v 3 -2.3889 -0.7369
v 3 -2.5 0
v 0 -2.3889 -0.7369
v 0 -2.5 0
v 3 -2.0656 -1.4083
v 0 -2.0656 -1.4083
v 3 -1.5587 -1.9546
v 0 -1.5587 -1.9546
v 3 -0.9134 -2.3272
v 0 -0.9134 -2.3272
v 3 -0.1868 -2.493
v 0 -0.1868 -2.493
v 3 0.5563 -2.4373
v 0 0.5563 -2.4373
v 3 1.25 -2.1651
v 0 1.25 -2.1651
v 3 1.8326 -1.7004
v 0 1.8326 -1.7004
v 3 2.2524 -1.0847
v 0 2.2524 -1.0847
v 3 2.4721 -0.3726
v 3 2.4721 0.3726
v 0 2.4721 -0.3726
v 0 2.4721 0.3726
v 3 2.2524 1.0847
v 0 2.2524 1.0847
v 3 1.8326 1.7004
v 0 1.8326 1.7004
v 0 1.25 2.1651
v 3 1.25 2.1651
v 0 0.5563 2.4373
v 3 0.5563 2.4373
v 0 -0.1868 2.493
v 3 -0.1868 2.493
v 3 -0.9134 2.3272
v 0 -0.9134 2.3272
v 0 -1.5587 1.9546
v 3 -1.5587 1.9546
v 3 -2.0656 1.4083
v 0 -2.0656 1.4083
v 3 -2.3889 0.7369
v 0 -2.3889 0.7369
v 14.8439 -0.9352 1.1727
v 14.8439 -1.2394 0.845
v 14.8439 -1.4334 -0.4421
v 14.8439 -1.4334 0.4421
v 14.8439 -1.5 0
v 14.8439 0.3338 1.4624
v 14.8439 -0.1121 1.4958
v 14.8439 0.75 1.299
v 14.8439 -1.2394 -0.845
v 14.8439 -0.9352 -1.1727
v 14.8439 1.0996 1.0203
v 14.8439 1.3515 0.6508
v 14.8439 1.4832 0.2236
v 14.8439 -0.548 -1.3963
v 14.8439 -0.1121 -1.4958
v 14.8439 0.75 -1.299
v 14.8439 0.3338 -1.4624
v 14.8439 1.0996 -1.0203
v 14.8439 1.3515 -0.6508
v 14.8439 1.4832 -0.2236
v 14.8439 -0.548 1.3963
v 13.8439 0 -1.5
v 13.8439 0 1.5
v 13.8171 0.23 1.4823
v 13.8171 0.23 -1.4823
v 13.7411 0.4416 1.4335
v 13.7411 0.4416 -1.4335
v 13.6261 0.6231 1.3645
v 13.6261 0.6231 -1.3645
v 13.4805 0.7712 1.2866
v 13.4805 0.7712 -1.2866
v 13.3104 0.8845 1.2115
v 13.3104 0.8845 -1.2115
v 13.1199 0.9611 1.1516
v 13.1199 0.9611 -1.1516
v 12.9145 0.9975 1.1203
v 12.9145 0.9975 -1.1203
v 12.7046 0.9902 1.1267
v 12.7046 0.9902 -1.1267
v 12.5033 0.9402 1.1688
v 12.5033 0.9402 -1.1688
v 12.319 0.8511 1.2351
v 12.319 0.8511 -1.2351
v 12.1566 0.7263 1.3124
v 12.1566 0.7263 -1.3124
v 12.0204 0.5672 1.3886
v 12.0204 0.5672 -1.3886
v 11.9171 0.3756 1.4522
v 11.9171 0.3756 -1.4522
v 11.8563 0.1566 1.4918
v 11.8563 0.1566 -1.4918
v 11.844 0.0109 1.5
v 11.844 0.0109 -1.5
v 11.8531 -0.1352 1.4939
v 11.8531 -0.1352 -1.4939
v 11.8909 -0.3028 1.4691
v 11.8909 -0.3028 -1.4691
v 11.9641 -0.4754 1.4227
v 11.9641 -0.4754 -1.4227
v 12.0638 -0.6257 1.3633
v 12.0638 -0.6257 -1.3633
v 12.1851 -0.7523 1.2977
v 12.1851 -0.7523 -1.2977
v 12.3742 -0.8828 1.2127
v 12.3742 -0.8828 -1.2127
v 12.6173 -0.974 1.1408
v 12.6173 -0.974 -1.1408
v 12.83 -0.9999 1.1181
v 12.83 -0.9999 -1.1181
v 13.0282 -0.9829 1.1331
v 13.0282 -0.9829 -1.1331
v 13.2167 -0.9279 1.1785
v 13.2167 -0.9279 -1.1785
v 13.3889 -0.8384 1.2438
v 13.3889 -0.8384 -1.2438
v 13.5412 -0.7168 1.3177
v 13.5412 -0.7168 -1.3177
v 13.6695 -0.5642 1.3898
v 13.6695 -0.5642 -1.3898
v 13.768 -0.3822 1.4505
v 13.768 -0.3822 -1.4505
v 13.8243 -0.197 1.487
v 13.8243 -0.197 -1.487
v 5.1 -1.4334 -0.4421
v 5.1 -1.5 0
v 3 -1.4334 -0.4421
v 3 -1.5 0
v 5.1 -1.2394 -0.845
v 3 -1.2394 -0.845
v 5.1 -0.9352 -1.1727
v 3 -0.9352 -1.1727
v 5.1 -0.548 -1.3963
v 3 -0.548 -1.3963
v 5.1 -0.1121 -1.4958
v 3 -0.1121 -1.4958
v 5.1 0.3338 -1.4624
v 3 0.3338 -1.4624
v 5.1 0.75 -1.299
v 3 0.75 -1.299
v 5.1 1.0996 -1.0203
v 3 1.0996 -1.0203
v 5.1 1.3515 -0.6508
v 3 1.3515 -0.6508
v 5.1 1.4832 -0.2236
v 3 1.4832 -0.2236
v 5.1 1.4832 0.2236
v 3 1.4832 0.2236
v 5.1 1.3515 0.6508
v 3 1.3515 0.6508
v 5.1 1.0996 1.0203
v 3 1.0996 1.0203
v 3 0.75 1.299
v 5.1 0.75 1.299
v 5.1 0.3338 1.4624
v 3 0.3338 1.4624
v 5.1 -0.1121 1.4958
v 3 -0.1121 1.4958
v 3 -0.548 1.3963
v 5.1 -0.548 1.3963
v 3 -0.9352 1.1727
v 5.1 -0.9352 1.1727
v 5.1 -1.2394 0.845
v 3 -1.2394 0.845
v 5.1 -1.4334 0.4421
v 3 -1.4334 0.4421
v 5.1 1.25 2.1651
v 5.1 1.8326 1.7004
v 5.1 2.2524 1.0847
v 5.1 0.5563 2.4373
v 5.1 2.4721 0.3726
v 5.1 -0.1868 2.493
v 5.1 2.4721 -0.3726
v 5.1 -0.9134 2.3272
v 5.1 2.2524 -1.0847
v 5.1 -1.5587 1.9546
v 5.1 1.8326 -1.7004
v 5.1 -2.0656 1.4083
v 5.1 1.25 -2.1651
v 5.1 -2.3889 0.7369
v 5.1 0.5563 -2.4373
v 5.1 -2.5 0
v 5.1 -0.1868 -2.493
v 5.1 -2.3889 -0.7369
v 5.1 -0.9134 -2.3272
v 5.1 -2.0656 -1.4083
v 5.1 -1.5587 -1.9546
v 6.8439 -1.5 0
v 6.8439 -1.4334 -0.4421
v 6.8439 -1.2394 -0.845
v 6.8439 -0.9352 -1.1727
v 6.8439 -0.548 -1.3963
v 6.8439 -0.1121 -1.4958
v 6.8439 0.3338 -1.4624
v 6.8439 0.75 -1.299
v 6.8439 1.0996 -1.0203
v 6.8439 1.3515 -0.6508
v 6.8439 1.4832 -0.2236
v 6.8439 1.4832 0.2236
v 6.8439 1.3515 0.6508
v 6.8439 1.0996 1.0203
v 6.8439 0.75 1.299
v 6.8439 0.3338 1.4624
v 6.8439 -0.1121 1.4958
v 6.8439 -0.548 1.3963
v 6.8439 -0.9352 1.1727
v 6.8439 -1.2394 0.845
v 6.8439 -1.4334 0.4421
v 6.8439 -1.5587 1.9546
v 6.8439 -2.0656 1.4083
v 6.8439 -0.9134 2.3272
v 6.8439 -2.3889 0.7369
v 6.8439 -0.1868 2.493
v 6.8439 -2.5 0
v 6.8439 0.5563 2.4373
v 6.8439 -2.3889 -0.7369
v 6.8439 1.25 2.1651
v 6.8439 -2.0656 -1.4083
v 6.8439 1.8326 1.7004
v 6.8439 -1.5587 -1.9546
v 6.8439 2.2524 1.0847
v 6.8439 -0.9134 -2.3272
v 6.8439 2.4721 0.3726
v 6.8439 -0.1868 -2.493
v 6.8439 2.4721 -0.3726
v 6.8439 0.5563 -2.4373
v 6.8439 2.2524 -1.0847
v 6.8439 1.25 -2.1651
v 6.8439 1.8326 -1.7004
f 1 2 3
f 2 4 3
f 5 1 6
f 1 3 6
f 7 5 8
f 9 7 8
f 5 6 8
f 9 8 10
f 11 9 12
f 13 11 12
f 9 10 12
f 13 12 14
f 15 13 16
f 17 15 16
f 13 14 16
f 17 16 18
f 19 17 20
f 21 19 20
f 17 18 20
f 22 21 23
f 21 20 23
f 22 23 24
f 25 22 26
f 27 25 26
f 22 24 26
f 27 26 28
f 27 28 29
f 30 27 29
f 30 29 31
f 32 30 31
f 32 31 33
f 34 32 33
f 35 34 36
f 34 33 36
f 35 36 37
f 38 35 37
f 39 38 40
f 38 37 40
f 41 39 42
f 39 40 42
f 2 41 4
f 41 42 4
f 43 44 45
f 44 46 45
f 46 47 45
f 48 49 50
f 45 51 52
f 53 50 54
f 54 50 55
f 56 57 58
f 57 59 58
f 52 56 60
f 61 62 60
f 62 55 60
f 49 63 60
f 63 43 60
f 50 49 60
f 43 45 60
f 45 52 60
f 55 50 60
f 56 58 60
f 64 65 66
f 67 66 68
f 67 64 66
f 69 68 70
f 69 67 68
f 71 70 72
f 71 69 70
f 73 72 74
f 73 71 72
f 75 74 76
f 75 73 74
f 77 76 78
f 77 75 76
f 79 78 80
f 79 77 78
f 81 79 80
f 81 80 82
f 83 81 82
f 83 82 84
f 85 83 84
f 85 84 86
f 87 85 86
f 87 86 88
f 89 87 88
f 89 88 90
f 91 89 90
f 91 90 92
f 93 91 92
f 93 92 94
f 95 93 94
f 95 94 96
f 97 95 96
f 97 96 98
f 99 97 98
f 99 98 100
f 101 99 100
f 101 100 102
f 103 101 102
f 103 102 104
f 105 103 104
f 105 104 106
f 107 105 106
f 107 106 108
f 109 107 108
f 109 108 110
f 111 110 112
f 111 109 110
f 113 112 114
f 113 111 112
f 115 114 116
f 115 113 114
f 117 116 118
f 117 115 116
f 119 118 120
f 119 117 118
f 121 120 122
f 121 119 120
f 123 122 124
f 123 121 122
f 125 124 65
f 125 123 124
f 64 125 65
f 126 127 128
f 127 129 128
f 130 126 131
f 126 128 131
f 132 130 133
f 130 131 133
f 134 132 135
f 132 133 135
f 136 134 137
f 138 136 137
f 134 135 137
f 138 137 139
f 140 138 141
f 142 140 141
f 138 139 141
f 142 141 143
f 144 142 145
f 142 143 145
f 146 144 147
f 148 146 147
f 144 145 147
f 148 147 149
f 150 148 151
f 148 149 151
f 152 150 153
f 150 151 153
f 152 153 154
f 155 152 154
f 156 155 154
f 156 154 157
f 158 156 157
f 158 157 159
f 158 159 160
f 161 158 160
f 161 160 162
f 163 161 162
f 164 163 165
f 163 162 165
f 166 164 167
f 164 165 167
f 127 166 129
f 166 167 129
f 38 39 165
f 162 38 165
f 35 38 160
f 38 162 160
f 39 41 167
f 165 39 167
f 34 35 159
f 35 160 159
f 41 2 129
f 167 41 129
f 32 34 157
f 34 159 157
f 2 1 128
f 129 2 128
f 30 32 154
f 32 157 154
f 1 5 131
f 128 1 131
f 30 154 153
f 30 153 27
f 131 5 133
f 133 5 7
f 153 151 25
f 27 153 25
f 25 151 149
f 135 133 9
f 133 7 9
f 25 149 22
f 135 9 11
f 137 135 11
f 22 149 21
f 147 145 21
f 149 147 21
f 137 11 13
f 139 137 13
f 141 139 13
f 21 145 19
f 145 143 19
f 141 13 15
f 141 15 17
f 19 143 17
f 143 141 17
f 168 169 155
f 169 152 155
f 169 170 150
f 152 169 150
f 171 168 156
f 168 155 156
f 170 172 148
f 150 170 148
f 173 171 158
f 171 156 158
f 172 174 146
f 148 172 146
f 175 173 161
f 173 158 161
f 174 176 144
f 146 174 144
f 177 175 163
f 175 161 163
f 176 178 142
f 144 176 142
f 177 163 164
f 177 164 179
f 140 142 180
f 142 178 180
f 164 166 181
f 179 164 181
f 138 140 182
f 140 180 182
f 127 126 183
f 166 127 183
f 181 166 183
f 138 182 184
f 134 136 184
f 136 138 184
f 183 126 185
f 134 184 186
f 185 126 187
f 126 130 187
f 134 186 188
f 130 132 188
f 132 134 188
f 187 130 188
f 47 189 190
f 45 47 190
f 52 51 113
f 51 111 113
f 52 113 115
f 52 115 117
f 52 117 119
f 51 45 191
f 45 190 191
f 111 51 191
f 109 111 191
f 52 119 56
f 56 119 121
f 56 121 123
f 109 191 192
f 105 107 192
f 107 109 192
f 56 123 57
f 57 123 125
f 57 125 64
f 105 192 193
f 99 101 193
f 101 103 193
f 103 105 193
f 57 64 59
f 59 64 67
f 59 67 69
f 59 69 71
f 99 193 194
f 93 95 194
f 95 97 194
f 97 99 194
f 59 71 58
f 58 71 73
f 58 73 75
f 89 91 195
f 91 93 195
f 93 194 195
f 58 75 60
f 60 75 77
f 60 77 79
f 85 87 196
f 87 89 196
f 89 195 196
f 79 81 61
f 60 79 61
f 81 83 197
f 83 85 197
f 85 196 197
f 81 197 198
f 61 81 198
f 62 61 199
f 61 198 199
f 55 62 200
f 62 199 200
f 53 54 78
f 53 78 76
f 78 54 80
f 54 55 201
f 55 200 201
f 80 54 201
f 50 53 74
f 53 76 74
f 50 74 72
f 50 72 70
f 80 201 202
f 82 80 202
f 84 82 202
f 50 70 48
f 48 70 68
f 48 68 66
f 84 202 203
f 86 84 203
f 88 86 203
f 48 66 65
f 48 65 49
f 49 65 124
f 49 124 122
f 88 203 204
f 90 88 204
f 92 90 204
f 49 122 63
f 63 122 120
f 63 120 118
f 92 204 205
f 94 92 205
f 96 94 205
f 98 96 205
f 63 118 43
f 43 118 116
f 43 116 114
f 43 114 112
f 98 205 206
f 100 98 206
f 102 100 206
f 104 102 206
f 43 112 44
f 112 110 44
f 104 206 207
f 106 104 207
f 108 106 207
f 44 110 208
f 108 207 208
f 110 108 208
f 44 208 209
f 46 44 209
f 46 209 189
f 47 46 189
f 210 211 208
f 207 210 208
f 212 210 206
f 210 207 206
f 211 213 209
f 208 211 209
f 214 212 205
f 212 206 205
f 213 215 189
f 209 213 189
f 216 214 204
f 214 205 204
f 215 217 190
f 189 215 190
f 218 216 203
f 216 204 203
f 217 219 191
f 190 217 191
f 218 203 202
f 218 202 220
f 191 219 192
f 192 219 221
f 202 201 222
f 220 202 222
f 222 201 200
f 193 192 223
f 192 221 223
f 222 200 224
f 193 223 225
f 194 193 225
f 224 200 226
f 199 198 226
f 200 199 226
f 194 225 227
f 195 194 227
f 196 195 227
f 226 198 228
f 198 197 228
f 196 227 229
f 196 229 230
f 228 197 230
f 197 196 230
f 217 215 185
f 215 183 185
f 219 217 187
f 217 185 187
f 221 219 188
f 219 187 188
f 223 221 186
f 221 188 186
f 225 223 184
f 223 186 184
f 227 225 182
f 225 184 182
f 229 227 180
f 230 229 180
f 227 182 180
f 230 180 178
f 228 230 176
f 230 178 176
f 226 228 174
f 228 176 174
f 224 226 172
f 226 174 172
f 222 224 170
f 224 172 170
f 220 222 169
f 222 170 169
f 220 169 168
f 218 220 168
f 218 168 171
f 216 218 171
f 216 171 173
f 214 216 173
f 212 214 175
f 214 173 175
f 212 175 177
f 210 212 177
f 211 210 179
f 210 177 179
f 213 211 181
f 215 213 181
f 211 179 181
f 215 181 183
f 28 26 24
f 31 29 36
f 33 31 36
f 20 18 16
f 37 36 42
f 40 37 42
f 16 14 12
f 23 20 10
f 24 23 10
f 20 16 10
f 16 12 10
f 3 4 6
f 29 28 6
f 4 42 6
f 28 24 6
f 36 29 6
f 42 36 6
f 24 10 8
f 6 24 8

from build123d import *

# Parameters (mm, degrees)
CUT_EXTRUDE1_DEPTH      = 16.259152832
CUT_EXTRUDE1_DEPTH_BACK = 16.259152832
SKETCH2_R               = 1


with BuildPart() as part:
    # Sketch1 → Revolve1 (revolve)
    with BuildSketch(Plane.XY, mode=Mode.PRIVATE) as revolve1_sk:
        Polygon((0, 2.5), (0, 0), (8.84391273, 0), (14.84391273, 0), (14.84391273, 1.5), (6.84391273, 1.5), (6.84391273, 2.5), (5.1, 2.5), (5.1, 1.5), (3, 1.5), (3, 2.5), align=None)
    revolve(revolve1_sk.sketch.rotate(Axis((0, 0, 0), (1, 0, 0)), 180), axis=Axis((0, 0, 0), (1, 0, 0)))

    # Sketch2 → Cut-Extrude1 (cut, two sides: drawn at the far end of the back side and taken through both)
    with BuildSketch(Plane.XY.offset(-CUT_EXTRUDE1_DEPTH_BACK)):
        with Locations((12.84391273, 0)):
            Circle(SKETCH2_R)
    extrude(amount=CUT_EXTRUDE1_DEPTH + CUT_EXTRUDE1_DEPTH_BACK, mode=Mode.SUBTRACT)


solid = part.part
